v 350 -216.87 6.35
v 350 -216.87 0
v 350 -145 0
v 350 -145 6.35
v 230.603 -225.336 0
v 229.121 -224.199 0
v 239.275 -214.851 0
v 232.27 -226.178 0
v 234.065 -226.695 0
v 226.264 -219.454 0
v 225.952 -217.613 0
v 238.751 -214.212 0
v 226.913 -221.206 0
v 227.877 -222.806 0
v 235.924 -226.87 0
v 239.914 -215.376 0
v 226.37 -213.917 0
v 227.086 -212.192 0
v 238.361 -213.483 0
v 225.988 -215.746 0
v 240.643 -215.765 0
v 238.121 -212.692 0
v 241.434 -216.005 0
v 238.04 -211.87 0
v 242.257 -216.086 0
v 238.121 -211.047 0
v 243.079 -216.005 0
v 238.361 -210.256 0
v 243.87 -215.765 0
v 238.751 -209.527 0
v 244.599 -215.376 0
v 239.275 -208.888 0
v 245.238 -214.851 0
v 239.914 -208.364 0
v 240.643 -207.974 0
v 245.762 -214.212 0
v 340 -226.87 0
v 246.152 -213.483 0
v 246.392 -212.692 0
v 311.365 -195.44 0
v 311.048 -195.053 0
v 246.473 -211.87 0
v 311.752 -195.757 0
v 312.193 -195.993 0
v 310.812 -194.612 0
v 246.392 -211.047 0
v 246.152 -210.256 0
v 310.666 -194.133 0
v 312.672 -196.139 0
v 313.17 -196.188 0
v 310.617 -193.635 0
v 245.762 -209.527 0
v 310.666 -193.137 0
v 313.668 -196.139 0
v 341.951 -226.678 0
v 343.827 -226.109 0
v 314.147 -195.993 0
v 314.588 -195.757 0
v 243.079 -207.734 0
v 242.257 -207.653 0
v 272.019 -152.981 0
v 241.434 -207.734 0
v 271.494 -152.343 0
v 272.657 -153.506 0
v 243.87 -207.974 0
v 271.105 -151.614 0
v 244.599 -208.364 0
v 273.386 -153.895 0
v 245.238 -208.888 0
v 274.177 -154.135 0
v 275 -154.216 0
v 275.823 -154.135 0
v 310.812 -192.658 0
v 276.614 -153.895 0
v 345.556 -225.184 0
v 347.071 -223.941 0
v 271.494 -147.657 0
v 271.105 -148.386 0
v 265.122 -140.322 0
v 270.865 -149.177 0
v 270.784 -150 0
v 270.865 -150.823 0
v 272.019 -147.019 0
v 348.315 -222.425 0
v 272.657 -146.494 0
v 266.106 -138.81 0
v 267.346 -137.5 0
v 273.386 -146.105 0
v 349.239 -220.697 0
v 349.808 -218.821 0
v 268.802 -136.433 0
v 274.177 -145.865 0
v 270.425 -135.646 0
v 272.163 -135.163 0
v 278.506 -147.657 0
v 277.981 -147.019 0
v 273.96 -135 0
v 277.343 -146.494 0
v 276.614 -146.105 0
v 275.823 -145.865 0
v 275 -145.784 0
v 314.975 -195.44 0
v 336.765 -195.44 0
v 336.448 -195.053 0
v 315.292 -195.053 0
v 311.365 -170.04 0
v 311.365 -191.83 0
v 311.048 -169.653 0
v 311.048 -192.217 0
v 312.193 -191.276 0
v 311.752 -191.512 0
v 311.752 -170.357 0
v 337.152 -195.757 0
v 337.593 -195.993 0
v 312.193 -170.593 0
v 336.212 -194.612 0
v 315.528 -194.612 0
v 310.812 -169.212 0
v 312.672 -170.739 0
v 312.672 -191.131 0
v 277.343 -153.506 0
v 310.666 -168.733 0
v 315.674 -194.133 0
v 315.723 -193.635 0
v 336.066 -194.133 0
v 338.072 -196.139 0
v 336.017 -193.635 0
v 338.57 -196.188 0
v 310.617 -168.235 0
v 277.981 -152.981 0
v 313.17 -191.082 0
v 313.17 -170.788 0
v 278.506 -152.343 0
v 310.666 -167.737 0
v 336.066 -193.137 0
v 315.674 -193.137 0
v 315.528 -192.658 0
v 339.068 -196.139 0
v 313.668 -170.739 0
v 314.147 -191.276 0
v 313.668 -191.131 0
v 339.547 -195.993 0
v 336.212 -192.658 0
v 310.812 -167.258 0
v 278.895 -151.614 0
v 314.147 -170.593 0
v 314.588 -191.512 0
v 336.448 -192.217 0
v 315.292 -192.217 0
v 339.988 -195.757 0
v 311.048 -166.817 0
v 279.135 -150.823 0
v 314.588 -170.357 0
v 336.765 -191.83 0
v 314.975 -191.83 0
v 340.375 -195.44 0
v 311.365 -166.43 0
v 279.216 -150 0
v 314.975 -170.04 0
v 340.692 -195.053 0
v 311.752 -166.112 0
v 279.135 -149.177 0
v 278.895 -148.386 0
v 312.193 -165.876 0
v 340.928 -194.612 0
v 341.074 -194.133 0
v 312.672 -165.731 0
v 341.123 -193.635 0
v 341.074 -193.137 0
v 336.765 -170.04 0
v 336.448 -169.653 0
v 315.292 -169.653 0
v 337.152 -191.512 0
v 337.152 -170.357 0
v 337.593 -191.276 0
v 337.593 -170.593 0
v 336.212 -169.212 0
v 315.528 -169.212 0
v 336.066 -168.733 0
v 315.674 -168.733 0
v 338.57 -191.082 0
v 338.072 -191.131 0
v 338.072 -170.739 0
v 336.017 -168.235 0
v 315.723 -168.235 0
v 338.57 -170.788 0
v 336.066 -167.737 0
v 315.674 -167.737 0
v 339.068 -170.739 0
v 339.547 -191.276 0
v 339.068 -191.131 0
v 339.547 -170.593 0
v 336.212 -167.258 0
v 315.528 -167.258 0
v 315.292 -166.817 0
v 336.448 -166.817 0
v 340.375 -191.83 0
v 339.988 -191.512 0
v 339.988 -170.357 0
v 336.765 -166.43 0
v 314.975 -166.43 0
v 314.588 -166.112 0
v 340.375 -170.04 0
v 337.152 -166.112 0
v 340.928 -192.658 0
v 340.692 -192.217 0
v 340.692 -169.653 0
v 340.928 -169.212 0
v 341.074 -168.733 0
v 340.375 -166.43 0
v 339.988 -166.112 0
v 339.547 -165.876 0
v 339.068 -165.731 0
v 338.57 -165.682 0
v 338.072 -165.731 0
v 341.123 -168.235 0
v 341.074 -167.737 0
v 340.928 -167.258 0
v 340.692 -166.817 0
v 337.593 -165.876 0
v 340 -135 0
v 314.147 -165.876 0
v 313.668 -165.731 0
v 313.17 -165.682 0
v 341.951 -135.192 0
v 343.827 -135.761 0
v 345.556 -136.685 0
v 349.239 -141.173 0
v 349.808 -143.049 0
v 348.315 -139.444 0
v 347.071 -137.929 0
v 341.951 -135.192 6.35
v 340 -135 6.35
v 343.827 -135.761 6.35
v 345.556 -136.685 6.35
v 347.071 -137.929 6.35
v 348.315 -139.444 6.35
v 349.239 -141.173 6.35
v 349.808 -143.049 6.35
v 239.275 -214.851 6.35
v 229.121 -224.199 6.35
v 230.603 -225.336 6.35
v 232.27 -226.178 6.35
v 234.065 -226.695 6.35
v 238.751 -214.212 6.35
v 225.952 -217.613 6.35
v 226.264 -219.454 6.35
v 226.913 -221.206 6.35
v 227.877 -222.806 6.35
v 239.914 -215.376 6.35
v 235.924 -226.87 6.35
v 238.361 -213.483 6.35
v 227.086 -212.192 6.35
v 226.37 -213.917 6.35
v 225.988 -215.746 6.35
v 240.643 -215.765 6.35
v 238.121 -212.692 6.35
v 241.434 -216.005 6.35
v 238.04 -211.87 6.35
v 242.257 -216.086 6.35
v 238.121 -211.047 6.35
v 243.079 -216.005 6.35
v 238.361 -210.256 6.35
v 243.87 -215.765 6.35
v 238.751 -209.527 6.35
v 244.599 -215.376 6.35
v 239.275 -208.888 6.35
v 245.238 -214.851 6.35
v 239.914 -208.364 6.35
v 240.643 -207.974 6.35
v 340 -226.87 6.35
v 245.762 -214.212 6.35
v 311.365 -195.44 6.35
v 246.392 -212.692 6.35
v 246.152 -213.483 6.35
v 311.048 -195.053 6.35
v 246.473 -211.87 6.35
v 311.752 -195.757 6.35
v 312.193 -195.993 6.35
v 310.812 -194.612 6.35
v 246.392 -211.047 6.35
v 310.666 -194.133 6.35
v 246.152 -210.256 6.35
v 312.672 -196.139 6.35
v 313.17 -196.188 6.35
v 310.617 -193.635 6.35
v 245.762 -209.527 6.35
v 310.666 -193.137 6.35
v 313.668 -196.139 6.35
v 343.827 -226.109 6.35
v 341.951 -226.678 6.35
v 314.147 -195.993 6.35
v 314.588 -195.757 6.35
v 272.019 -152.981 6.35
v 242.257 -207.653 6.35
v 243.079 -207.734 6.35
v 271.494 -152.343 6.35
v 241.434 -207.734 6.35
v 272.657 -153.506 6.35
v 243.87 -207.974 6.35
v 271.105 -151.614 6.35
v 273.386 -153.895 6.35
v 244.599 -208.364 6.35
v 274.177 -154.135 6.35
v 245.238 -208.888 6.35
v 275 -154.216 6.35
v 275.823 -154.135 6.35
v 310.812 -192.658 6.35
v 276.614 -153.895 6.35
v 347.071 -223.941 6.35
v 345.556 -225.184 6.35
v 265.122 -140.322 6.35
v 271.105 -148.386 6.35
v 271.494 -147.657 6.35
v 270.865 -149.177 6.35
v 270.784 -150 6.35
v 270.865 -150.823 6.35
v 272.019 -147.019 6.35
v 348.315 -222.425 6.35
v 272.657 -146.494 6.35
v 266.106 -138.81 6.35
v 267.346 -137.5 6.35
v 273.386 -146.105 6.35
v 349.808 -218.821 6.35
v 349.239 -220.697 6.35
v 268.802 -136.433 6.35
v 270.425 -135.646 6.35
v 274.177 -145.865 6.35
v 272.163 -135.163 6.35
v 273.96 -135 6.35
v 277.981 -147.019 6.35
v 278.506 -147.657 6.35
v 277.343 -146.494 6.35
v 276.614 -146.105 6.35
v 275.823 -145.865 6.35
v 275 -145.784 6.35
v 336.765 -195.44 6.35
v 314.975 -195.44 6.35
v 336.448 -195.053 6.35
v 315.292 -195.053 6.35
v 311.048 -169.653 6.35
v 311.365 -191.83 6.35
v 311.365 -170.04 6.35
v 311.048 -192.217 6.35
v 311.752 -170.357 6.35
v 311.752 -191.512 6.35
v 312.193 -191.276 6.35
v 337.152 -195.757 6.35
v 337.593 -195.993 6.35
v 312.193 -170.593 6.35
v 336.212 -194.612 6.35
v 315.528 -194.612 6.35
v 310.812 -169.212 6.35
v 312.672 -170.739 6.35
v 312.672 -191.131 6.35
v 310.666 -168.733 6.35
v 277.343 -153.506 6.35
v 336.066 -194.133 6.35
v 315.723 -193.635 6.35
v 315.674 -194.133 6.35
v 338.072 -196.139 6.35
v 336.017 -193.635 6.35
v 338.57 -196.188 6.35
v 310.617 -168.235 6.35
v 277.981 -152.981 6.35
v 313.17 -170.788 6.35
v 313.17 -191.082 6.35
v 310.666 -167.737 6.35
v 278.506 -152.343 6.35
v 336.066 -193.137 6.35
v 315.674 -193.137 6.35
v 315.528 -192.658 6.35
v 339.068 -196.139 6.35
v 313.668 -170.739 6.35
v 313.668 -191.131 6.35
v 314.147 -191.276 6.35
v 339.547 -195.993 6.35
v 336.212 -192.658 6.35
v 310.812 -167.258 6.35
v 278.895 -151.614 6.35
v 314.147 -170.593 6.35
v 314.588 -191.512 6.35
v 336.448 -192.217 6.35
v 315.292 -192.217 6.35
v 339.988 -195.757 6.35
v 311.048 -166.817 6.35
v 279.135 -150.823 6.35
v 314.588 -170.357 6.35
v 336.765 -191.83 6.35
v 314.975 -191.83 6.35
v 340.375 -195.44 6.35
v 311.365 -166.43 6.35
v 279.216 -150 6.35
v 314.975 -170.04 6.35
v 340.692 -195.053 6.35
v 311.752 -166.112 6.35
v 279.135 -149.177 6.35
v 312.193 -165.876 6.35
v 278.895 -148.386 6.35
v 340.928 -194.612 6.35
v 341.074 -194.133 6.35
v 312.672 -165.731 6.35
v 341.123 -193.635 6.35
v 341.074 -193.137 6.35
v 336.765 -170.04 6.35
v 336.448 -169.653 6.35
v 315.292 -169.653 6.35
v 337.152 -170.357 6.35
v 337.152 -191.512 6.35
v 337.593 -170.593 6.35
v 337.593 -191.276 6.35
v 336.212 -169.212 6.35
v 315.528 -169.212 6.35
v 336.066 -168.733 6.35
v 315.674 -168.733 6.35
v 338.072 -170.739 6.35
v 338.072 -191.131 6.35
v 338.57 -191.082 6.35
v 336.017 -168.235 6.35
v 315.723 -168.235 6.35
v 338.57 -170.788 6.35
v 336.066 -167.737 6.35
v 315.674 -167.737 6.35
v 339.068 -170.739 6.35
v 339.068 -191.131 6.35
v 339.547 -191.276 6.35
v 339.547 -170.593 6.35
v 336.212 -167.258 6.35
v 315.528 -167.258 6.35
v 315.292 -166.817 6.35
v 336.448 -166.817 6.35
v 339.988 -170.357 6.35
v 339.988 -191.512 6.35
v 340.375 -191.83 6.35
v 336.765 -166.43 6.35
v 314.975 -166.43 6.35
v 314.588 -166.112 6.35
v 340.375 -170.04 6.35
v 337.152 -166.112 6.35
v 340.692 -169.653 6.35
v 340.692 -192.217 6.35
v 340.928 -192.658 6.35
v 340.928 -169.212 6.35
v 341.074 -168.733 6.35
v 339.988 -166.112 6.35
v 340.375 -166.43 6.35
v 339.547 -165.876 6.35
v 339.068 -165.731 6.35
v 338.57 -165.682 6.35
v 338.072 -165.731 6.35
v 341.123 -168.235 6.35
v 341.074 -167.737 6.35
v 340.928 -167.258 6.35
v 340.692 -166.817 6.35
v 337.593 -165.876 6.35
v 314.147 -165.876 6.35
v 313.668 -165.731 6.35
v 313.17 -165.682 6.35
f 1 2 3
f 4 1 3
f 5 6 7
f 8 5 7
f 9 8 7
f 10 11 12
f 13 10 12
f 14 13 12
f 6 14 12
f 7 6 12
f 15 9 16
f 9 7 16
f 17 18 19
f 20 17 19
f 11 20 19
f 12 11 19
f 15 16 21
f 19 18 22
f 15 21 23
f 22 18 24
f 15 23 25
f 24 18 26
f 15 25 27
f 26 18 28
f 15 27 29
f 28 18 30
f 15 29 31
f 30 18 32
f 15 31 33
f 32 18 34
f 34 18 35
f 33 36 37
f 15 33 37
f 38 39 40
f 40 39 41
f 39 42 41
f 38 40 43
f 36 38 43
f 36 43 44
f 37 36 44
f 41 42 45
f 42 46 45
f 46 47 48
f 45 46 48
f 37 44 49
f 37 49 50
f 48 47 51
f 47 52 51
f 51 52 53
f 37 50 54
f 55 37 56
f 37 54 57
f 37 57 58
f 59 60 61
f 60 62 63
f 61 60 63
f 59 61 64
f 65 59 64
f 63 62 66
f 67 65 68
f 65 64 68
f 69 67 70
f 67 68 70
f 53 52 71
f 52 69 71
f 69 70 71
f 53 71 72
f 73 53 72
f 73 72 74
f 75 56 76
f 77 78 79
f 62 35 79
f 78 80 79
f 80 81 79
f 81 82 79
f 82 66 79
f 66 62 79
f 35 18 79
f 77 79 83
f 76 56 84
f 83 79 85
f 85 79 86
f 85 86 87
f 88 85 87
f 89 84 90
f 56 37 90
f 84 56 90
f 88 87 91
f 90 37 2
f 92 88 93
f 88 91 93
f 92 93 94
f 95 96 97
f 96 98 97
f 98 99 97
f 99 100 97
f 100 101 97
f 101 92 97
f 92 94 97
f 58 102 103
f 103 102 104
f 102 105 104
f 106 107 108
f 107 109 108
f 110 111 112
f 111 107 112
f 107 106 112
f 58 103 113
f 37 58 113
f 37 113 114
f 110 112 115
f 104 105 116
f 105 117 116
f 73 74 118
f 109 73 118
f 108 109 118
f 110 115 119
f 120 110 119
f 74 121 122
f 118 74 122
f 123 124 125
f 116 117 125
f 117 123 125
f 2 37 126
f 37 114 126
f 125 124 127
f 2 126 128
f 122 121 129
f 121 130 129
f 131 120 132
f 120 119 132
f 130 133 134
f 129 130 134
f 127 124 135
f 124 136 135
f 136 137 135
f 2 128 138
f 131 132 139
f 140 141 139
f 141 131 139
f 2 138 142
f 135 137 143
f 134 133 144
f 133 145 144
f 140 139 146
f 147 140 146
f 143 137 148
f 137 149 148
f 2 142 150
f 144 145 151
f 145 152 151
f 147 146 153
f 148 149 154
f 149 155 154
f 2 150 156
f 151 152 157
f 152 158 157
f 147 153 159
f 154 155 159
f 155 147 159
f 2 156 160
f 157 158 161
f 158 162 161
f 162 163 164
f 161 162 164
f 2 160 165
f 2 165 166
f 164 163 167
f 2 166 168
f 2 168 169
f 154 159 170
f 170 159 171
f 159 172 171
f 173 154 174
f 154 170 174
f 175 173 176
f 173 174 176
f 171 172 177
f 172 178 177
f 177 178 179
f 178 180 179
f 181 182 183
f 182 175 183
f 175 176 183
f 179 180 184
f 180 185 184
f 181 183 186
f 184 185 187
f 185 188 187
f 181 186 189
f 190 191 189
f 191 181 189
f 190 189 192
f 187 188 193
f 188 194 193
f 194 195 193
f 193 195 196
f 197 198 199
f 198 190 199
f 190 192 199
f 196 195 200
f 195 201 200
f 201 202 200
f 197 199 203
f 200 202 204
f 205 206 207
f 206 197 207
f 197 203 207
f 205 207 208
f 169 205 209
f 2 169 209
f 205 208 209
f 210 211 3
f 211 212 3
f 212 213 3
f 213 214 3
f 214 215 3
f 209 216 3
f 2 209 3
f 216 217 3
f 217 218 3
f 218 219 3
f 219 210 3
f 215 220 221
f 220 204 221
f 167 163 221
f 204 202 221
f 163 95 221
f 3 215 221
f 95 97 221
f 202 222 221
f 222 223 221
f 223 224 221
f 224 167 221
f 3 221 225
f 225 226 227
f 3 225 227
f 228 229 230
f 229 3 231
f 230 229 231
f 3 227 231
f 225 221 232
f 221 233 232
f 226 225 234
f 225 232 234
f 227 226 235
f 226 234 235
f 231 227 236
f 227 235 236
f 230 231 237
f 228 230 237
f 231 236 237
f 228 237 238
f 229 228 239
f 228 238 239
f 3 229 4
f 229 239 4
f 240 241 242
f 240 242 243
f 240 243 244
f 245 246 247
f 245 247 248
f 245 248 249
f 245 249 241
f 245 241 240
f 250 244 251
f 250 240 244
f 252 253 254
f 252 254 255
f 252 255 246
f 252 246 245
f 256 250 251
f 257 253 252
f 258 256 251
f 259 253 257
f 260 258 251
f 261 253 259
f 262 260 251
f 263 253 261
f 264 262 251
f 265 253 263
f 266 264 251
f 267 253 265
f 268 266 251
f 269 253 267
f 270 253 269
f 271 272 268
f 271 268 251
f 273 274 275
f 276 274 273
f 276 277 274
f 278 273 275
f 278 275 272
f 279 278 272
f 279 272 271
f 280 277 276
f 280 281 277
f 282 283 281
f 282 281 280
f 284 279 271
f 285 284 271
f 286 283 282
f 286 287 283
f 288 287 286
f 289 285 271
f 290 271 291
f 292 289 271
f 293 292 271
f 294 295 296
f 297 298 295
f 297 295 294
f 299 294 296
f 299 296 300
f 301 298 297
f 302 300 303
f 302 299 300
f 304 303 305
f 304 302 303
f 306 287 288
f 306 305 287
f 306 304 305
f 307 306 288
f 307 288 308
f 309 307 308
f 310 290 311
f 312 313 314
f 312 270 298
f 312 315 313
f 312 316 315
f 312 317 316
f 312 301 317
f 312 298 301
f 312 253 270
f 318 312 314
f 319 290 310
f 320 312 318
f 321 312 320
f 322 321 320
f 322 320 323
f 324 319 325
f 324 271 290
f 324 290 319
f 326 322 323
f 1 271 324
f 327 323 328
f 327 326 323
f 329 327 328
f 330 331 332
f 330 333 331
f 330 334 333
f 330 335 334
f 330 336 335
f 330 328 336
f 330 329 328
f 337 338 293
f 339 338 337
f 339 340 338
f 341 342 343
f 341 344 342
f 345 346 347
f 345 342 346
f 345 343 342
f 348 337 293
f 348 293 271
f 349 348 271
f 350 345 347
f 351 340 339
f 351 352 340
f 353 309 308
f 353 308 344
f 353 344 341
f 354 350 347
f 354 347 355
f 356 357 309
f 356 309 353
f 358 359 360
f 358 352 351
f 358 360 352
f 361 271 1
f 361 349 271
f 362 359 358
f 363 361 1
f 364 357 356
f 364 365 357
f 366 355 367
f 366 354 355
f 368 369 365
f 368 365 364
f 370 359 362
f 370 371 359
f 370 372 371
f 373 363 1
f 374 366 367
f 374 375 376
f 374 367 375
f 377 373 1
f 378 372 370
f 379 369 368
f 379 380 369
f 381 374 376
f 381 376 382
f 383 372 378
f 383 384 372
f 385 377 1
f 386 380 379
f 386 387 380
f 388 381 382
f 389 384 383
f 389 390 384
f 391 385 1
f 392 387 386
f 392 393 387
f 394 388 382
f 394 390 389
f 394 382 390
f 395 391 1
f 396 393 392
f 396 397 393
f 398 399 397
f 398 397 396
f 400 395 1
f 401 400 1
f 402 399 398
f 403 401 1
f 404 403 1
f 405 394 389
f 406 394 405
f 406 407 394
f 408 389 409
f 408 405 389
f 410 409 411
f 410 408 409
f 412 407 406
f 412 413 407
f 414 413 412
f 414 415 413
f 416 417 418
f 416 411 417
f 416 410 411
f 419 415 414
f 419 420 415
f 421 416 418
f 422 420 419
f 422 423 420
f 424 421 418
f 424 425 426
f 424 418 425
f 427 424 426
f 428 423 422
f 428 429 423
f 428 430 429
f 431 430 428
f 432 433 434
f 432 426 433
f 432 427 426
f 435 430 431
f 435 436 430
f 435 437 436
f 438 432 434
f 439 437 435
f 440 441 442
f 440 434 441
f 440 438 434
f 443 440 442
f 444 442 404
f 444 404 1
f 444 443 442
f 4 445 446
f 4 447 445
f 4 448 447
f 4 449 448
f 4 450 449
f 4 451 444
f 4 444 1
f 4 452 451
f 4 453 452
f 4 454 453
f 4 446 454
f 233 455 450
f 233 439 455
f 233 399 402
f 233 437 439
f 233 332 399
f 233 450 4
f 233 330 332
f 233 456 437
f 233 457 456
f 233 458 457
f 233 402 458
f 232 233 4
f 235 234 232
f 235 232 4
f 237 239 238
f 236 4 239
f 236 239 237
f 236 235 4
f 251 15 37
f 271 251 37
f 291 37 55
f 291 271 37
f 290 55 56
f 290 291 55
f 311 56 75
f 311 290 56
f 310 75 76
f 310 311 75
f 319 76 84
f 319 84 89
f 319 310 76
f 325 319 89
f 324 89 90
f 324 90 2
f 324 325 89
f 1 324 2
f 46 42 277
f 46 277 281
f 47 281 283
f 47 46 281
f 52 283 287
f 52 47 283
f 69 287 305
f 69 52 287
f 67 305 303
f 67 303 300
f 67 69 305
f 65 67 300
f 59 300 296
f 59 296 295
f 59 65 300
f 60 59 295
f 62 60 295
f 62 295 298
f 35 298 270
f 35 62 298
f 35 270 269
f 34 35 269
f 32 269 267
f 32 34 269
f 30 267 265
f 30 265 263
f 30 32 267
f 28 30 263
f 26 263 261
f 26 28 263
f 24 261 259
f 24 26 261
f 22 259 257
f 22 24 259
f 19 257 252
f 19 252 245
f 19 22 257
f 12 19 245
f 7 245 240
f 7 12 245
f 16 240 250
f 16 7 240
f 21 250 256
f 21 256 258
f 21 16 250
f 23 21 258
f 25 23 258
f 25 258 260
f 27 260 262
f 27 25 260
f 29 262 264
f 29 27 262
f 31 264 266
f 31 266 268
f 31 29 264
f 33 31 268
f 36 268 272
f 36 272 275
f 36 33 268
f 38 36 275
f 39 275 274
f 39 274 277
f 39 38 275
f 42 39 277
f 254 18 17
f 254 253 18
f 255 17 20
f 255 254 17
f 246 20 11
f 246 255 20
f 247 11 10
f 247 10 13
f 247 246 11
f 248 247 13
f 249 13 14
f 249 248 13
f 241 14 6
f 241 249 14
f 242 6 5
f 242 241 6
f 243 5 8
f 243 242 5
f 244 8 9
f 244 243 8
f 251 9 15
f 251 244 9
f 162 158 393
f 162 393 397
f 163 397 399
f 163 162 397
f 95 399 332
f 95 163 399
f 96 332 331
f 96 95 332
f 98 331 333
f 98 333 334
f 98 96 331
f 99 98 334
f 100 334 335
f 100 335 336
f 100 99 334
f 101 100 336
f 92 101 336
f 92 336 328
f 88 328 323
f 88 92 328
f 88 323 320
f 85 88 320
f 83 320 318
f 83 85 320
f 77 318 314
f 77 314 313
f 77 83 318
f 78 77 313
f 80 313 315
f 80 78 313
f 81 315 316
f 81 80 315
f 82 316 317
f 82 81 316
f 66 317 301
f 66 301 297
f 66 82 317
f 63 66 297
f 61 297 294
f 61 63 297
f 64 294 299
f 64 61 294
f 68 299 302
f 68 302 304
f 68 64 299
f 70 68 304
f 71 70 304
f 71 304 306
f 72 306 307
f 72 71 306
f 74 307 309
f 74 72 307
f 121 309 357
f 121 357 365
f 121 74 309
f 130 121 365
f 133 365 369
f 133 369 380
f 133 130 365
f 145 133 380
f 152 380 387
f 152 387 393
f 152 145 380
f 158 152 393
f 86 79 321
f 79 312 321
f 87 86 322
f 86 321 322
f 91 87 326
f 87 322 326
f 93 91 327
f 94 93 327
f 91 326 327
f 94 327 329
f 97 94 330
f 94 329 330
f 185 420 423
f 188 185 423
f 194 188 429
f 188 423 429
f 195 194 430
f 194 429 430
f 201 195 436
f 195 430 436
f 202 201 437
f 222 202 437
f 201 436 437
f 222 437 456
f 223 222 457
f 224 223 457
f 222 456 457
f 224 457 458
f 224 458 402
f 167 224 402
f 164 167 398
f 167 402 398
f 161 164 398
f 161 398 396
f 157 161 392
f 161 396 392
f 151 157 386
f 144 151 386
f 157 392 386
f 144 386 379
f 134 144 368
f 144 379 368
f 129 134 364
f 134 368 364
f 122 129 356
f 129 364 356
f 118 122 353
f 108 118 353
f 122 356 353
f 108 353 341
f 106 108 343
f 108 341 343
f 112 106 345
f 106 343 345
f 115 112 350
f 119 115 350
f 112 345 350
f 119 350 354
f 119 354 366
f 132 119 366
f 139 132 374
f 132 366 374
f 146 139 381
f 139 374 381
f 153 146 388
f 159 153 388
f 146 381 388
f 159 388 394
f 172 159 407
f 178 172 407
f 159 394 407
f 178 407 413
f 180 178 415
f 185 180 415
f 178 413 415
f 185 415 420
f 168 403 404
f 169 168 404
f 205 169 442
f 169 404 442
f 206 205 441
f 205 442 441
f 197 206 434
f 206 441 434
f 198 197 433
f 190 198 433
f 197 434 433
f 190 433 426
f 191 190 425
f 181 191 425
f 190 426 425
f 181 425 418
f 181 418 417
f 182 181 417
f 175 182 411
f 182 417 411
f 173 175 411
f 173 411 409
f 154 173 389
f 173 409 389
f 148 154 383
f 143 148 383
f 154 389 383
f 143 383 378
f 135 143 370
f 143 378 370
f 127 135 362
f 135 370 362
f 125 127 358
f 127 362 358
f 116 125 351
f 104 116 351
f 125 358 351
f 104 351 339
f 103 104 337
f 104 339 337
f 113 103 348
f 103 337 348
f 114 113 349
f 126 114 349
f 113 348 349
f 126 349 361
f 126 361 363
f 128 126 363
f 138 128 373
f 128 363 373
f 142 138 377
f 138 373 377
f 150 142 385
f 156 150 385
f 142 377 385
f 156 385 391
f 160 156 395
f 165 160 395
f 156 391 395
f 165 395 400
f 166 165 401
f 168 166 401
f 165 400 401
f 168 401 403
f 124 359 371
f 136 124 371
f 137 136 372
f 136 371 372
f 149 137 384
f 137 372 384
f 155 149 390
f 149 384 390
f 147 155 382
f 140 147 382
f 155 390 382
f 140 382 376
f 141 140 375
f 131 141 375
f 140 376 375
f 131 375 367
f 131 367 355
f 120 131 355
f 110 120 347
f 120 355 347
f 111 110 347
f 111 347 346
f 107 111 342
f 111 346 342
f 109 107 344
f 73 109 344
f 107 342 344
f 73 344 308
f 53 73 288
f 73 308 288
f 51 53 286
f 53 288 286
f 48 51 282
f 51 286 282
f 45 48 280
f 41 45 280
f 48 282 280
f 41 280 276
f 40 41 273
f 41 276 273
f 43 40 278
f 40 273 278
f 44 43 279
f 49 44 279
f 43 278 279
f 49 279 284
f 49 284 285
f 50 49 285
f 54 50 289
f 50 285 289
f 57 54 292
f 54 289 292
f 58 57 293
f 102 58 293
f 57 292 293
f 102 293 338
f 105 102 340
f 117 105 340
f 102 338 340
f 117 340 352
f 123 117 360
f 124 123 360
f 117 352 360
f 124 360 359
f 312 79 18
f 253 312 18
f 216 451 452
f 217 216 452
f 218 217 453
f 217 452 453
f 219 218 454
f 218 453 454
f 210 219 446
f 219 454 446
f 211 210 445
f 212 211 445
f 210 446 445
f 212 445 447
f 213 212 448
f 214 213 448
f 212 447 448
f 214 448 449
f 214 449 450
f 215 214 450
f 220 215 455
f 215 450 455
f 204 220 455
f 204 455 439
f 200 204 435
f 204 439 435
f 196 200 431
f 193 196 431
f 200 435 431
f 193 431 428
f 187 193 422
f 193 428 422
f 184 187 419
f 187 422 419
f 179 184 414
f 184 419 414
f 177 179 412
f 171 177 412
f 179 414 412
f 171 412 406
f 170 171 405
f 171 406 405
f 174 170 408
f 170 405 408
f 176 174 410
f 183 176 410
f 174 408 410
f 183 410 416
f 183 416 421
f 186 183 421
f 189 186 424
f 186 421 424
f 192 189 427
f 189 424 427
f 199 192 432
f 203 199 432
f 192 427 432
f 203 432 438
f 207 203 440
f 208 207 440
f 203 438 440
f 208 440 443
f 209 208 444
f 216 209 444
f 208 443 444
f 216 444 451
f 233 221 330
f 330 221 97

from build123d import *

# Parameters (mm, degrees)
SKETCH1_R           = 4.2164
BOSS_EXTRUDE1_DEPTH = 6.35
SKETCH2_R           = 2.5527
CUT_EXTRUDE1_DEPTH  = 6.35
FILLET1_R           = 10


with BuildPart() as part:
    # Sketch1 → Boss-Extrude1 (new body)
    with BuildSketch(Plane.XY):
        Polygon((267.938493178, -135), (219.318011435, -226.869730158), (350, -226.869730158), (350, -135), align=None)
        with Locations((275, -150)):
            Circle(SKETCH1_R, mode=Mode.SUBTRACT)
        with Locations((242.256504613, -211.869730158)):
            Circle(SKETCH1_R, mode=Mode.SUBTRACT)
    extrude(amount=BOSS_EXTRUDE1_DEPTH)

    # Sketch2 → Cut-Extrude1 (cut)
    with BuildSketch(Plane.XY.offset(6.35)):
        with Locations((313.17, -168.234865079)):
            Circle(SKETCH2_R)
        with Locations((338.57, -168.234865079)):
            Circle(SKETCH2_R)
        with Locations((313.17, -193.634865079)):
            Circle(SKETCH2_R)
        with Locations((338.57, -193.634865079)):
            Circle(SKETCH2_R)
    extrude(amount=-CUT_EXTRUDE1_DEPTH, mode=Mode.SUBTRACT)

    # Fillet1
    fillet1_edges = [part.edges().sort_by_distance(p)[0] for p in [
        (350, -135, 3.175),
        (350, -226.869730158, 3.175),
        (219.318011435, -226.869730158, 3.175),
        (267.938493178, -135, 3.175),
    ]]
    fillet(fillet1_edges, radius=FILLET1_R)


solid = part.part
